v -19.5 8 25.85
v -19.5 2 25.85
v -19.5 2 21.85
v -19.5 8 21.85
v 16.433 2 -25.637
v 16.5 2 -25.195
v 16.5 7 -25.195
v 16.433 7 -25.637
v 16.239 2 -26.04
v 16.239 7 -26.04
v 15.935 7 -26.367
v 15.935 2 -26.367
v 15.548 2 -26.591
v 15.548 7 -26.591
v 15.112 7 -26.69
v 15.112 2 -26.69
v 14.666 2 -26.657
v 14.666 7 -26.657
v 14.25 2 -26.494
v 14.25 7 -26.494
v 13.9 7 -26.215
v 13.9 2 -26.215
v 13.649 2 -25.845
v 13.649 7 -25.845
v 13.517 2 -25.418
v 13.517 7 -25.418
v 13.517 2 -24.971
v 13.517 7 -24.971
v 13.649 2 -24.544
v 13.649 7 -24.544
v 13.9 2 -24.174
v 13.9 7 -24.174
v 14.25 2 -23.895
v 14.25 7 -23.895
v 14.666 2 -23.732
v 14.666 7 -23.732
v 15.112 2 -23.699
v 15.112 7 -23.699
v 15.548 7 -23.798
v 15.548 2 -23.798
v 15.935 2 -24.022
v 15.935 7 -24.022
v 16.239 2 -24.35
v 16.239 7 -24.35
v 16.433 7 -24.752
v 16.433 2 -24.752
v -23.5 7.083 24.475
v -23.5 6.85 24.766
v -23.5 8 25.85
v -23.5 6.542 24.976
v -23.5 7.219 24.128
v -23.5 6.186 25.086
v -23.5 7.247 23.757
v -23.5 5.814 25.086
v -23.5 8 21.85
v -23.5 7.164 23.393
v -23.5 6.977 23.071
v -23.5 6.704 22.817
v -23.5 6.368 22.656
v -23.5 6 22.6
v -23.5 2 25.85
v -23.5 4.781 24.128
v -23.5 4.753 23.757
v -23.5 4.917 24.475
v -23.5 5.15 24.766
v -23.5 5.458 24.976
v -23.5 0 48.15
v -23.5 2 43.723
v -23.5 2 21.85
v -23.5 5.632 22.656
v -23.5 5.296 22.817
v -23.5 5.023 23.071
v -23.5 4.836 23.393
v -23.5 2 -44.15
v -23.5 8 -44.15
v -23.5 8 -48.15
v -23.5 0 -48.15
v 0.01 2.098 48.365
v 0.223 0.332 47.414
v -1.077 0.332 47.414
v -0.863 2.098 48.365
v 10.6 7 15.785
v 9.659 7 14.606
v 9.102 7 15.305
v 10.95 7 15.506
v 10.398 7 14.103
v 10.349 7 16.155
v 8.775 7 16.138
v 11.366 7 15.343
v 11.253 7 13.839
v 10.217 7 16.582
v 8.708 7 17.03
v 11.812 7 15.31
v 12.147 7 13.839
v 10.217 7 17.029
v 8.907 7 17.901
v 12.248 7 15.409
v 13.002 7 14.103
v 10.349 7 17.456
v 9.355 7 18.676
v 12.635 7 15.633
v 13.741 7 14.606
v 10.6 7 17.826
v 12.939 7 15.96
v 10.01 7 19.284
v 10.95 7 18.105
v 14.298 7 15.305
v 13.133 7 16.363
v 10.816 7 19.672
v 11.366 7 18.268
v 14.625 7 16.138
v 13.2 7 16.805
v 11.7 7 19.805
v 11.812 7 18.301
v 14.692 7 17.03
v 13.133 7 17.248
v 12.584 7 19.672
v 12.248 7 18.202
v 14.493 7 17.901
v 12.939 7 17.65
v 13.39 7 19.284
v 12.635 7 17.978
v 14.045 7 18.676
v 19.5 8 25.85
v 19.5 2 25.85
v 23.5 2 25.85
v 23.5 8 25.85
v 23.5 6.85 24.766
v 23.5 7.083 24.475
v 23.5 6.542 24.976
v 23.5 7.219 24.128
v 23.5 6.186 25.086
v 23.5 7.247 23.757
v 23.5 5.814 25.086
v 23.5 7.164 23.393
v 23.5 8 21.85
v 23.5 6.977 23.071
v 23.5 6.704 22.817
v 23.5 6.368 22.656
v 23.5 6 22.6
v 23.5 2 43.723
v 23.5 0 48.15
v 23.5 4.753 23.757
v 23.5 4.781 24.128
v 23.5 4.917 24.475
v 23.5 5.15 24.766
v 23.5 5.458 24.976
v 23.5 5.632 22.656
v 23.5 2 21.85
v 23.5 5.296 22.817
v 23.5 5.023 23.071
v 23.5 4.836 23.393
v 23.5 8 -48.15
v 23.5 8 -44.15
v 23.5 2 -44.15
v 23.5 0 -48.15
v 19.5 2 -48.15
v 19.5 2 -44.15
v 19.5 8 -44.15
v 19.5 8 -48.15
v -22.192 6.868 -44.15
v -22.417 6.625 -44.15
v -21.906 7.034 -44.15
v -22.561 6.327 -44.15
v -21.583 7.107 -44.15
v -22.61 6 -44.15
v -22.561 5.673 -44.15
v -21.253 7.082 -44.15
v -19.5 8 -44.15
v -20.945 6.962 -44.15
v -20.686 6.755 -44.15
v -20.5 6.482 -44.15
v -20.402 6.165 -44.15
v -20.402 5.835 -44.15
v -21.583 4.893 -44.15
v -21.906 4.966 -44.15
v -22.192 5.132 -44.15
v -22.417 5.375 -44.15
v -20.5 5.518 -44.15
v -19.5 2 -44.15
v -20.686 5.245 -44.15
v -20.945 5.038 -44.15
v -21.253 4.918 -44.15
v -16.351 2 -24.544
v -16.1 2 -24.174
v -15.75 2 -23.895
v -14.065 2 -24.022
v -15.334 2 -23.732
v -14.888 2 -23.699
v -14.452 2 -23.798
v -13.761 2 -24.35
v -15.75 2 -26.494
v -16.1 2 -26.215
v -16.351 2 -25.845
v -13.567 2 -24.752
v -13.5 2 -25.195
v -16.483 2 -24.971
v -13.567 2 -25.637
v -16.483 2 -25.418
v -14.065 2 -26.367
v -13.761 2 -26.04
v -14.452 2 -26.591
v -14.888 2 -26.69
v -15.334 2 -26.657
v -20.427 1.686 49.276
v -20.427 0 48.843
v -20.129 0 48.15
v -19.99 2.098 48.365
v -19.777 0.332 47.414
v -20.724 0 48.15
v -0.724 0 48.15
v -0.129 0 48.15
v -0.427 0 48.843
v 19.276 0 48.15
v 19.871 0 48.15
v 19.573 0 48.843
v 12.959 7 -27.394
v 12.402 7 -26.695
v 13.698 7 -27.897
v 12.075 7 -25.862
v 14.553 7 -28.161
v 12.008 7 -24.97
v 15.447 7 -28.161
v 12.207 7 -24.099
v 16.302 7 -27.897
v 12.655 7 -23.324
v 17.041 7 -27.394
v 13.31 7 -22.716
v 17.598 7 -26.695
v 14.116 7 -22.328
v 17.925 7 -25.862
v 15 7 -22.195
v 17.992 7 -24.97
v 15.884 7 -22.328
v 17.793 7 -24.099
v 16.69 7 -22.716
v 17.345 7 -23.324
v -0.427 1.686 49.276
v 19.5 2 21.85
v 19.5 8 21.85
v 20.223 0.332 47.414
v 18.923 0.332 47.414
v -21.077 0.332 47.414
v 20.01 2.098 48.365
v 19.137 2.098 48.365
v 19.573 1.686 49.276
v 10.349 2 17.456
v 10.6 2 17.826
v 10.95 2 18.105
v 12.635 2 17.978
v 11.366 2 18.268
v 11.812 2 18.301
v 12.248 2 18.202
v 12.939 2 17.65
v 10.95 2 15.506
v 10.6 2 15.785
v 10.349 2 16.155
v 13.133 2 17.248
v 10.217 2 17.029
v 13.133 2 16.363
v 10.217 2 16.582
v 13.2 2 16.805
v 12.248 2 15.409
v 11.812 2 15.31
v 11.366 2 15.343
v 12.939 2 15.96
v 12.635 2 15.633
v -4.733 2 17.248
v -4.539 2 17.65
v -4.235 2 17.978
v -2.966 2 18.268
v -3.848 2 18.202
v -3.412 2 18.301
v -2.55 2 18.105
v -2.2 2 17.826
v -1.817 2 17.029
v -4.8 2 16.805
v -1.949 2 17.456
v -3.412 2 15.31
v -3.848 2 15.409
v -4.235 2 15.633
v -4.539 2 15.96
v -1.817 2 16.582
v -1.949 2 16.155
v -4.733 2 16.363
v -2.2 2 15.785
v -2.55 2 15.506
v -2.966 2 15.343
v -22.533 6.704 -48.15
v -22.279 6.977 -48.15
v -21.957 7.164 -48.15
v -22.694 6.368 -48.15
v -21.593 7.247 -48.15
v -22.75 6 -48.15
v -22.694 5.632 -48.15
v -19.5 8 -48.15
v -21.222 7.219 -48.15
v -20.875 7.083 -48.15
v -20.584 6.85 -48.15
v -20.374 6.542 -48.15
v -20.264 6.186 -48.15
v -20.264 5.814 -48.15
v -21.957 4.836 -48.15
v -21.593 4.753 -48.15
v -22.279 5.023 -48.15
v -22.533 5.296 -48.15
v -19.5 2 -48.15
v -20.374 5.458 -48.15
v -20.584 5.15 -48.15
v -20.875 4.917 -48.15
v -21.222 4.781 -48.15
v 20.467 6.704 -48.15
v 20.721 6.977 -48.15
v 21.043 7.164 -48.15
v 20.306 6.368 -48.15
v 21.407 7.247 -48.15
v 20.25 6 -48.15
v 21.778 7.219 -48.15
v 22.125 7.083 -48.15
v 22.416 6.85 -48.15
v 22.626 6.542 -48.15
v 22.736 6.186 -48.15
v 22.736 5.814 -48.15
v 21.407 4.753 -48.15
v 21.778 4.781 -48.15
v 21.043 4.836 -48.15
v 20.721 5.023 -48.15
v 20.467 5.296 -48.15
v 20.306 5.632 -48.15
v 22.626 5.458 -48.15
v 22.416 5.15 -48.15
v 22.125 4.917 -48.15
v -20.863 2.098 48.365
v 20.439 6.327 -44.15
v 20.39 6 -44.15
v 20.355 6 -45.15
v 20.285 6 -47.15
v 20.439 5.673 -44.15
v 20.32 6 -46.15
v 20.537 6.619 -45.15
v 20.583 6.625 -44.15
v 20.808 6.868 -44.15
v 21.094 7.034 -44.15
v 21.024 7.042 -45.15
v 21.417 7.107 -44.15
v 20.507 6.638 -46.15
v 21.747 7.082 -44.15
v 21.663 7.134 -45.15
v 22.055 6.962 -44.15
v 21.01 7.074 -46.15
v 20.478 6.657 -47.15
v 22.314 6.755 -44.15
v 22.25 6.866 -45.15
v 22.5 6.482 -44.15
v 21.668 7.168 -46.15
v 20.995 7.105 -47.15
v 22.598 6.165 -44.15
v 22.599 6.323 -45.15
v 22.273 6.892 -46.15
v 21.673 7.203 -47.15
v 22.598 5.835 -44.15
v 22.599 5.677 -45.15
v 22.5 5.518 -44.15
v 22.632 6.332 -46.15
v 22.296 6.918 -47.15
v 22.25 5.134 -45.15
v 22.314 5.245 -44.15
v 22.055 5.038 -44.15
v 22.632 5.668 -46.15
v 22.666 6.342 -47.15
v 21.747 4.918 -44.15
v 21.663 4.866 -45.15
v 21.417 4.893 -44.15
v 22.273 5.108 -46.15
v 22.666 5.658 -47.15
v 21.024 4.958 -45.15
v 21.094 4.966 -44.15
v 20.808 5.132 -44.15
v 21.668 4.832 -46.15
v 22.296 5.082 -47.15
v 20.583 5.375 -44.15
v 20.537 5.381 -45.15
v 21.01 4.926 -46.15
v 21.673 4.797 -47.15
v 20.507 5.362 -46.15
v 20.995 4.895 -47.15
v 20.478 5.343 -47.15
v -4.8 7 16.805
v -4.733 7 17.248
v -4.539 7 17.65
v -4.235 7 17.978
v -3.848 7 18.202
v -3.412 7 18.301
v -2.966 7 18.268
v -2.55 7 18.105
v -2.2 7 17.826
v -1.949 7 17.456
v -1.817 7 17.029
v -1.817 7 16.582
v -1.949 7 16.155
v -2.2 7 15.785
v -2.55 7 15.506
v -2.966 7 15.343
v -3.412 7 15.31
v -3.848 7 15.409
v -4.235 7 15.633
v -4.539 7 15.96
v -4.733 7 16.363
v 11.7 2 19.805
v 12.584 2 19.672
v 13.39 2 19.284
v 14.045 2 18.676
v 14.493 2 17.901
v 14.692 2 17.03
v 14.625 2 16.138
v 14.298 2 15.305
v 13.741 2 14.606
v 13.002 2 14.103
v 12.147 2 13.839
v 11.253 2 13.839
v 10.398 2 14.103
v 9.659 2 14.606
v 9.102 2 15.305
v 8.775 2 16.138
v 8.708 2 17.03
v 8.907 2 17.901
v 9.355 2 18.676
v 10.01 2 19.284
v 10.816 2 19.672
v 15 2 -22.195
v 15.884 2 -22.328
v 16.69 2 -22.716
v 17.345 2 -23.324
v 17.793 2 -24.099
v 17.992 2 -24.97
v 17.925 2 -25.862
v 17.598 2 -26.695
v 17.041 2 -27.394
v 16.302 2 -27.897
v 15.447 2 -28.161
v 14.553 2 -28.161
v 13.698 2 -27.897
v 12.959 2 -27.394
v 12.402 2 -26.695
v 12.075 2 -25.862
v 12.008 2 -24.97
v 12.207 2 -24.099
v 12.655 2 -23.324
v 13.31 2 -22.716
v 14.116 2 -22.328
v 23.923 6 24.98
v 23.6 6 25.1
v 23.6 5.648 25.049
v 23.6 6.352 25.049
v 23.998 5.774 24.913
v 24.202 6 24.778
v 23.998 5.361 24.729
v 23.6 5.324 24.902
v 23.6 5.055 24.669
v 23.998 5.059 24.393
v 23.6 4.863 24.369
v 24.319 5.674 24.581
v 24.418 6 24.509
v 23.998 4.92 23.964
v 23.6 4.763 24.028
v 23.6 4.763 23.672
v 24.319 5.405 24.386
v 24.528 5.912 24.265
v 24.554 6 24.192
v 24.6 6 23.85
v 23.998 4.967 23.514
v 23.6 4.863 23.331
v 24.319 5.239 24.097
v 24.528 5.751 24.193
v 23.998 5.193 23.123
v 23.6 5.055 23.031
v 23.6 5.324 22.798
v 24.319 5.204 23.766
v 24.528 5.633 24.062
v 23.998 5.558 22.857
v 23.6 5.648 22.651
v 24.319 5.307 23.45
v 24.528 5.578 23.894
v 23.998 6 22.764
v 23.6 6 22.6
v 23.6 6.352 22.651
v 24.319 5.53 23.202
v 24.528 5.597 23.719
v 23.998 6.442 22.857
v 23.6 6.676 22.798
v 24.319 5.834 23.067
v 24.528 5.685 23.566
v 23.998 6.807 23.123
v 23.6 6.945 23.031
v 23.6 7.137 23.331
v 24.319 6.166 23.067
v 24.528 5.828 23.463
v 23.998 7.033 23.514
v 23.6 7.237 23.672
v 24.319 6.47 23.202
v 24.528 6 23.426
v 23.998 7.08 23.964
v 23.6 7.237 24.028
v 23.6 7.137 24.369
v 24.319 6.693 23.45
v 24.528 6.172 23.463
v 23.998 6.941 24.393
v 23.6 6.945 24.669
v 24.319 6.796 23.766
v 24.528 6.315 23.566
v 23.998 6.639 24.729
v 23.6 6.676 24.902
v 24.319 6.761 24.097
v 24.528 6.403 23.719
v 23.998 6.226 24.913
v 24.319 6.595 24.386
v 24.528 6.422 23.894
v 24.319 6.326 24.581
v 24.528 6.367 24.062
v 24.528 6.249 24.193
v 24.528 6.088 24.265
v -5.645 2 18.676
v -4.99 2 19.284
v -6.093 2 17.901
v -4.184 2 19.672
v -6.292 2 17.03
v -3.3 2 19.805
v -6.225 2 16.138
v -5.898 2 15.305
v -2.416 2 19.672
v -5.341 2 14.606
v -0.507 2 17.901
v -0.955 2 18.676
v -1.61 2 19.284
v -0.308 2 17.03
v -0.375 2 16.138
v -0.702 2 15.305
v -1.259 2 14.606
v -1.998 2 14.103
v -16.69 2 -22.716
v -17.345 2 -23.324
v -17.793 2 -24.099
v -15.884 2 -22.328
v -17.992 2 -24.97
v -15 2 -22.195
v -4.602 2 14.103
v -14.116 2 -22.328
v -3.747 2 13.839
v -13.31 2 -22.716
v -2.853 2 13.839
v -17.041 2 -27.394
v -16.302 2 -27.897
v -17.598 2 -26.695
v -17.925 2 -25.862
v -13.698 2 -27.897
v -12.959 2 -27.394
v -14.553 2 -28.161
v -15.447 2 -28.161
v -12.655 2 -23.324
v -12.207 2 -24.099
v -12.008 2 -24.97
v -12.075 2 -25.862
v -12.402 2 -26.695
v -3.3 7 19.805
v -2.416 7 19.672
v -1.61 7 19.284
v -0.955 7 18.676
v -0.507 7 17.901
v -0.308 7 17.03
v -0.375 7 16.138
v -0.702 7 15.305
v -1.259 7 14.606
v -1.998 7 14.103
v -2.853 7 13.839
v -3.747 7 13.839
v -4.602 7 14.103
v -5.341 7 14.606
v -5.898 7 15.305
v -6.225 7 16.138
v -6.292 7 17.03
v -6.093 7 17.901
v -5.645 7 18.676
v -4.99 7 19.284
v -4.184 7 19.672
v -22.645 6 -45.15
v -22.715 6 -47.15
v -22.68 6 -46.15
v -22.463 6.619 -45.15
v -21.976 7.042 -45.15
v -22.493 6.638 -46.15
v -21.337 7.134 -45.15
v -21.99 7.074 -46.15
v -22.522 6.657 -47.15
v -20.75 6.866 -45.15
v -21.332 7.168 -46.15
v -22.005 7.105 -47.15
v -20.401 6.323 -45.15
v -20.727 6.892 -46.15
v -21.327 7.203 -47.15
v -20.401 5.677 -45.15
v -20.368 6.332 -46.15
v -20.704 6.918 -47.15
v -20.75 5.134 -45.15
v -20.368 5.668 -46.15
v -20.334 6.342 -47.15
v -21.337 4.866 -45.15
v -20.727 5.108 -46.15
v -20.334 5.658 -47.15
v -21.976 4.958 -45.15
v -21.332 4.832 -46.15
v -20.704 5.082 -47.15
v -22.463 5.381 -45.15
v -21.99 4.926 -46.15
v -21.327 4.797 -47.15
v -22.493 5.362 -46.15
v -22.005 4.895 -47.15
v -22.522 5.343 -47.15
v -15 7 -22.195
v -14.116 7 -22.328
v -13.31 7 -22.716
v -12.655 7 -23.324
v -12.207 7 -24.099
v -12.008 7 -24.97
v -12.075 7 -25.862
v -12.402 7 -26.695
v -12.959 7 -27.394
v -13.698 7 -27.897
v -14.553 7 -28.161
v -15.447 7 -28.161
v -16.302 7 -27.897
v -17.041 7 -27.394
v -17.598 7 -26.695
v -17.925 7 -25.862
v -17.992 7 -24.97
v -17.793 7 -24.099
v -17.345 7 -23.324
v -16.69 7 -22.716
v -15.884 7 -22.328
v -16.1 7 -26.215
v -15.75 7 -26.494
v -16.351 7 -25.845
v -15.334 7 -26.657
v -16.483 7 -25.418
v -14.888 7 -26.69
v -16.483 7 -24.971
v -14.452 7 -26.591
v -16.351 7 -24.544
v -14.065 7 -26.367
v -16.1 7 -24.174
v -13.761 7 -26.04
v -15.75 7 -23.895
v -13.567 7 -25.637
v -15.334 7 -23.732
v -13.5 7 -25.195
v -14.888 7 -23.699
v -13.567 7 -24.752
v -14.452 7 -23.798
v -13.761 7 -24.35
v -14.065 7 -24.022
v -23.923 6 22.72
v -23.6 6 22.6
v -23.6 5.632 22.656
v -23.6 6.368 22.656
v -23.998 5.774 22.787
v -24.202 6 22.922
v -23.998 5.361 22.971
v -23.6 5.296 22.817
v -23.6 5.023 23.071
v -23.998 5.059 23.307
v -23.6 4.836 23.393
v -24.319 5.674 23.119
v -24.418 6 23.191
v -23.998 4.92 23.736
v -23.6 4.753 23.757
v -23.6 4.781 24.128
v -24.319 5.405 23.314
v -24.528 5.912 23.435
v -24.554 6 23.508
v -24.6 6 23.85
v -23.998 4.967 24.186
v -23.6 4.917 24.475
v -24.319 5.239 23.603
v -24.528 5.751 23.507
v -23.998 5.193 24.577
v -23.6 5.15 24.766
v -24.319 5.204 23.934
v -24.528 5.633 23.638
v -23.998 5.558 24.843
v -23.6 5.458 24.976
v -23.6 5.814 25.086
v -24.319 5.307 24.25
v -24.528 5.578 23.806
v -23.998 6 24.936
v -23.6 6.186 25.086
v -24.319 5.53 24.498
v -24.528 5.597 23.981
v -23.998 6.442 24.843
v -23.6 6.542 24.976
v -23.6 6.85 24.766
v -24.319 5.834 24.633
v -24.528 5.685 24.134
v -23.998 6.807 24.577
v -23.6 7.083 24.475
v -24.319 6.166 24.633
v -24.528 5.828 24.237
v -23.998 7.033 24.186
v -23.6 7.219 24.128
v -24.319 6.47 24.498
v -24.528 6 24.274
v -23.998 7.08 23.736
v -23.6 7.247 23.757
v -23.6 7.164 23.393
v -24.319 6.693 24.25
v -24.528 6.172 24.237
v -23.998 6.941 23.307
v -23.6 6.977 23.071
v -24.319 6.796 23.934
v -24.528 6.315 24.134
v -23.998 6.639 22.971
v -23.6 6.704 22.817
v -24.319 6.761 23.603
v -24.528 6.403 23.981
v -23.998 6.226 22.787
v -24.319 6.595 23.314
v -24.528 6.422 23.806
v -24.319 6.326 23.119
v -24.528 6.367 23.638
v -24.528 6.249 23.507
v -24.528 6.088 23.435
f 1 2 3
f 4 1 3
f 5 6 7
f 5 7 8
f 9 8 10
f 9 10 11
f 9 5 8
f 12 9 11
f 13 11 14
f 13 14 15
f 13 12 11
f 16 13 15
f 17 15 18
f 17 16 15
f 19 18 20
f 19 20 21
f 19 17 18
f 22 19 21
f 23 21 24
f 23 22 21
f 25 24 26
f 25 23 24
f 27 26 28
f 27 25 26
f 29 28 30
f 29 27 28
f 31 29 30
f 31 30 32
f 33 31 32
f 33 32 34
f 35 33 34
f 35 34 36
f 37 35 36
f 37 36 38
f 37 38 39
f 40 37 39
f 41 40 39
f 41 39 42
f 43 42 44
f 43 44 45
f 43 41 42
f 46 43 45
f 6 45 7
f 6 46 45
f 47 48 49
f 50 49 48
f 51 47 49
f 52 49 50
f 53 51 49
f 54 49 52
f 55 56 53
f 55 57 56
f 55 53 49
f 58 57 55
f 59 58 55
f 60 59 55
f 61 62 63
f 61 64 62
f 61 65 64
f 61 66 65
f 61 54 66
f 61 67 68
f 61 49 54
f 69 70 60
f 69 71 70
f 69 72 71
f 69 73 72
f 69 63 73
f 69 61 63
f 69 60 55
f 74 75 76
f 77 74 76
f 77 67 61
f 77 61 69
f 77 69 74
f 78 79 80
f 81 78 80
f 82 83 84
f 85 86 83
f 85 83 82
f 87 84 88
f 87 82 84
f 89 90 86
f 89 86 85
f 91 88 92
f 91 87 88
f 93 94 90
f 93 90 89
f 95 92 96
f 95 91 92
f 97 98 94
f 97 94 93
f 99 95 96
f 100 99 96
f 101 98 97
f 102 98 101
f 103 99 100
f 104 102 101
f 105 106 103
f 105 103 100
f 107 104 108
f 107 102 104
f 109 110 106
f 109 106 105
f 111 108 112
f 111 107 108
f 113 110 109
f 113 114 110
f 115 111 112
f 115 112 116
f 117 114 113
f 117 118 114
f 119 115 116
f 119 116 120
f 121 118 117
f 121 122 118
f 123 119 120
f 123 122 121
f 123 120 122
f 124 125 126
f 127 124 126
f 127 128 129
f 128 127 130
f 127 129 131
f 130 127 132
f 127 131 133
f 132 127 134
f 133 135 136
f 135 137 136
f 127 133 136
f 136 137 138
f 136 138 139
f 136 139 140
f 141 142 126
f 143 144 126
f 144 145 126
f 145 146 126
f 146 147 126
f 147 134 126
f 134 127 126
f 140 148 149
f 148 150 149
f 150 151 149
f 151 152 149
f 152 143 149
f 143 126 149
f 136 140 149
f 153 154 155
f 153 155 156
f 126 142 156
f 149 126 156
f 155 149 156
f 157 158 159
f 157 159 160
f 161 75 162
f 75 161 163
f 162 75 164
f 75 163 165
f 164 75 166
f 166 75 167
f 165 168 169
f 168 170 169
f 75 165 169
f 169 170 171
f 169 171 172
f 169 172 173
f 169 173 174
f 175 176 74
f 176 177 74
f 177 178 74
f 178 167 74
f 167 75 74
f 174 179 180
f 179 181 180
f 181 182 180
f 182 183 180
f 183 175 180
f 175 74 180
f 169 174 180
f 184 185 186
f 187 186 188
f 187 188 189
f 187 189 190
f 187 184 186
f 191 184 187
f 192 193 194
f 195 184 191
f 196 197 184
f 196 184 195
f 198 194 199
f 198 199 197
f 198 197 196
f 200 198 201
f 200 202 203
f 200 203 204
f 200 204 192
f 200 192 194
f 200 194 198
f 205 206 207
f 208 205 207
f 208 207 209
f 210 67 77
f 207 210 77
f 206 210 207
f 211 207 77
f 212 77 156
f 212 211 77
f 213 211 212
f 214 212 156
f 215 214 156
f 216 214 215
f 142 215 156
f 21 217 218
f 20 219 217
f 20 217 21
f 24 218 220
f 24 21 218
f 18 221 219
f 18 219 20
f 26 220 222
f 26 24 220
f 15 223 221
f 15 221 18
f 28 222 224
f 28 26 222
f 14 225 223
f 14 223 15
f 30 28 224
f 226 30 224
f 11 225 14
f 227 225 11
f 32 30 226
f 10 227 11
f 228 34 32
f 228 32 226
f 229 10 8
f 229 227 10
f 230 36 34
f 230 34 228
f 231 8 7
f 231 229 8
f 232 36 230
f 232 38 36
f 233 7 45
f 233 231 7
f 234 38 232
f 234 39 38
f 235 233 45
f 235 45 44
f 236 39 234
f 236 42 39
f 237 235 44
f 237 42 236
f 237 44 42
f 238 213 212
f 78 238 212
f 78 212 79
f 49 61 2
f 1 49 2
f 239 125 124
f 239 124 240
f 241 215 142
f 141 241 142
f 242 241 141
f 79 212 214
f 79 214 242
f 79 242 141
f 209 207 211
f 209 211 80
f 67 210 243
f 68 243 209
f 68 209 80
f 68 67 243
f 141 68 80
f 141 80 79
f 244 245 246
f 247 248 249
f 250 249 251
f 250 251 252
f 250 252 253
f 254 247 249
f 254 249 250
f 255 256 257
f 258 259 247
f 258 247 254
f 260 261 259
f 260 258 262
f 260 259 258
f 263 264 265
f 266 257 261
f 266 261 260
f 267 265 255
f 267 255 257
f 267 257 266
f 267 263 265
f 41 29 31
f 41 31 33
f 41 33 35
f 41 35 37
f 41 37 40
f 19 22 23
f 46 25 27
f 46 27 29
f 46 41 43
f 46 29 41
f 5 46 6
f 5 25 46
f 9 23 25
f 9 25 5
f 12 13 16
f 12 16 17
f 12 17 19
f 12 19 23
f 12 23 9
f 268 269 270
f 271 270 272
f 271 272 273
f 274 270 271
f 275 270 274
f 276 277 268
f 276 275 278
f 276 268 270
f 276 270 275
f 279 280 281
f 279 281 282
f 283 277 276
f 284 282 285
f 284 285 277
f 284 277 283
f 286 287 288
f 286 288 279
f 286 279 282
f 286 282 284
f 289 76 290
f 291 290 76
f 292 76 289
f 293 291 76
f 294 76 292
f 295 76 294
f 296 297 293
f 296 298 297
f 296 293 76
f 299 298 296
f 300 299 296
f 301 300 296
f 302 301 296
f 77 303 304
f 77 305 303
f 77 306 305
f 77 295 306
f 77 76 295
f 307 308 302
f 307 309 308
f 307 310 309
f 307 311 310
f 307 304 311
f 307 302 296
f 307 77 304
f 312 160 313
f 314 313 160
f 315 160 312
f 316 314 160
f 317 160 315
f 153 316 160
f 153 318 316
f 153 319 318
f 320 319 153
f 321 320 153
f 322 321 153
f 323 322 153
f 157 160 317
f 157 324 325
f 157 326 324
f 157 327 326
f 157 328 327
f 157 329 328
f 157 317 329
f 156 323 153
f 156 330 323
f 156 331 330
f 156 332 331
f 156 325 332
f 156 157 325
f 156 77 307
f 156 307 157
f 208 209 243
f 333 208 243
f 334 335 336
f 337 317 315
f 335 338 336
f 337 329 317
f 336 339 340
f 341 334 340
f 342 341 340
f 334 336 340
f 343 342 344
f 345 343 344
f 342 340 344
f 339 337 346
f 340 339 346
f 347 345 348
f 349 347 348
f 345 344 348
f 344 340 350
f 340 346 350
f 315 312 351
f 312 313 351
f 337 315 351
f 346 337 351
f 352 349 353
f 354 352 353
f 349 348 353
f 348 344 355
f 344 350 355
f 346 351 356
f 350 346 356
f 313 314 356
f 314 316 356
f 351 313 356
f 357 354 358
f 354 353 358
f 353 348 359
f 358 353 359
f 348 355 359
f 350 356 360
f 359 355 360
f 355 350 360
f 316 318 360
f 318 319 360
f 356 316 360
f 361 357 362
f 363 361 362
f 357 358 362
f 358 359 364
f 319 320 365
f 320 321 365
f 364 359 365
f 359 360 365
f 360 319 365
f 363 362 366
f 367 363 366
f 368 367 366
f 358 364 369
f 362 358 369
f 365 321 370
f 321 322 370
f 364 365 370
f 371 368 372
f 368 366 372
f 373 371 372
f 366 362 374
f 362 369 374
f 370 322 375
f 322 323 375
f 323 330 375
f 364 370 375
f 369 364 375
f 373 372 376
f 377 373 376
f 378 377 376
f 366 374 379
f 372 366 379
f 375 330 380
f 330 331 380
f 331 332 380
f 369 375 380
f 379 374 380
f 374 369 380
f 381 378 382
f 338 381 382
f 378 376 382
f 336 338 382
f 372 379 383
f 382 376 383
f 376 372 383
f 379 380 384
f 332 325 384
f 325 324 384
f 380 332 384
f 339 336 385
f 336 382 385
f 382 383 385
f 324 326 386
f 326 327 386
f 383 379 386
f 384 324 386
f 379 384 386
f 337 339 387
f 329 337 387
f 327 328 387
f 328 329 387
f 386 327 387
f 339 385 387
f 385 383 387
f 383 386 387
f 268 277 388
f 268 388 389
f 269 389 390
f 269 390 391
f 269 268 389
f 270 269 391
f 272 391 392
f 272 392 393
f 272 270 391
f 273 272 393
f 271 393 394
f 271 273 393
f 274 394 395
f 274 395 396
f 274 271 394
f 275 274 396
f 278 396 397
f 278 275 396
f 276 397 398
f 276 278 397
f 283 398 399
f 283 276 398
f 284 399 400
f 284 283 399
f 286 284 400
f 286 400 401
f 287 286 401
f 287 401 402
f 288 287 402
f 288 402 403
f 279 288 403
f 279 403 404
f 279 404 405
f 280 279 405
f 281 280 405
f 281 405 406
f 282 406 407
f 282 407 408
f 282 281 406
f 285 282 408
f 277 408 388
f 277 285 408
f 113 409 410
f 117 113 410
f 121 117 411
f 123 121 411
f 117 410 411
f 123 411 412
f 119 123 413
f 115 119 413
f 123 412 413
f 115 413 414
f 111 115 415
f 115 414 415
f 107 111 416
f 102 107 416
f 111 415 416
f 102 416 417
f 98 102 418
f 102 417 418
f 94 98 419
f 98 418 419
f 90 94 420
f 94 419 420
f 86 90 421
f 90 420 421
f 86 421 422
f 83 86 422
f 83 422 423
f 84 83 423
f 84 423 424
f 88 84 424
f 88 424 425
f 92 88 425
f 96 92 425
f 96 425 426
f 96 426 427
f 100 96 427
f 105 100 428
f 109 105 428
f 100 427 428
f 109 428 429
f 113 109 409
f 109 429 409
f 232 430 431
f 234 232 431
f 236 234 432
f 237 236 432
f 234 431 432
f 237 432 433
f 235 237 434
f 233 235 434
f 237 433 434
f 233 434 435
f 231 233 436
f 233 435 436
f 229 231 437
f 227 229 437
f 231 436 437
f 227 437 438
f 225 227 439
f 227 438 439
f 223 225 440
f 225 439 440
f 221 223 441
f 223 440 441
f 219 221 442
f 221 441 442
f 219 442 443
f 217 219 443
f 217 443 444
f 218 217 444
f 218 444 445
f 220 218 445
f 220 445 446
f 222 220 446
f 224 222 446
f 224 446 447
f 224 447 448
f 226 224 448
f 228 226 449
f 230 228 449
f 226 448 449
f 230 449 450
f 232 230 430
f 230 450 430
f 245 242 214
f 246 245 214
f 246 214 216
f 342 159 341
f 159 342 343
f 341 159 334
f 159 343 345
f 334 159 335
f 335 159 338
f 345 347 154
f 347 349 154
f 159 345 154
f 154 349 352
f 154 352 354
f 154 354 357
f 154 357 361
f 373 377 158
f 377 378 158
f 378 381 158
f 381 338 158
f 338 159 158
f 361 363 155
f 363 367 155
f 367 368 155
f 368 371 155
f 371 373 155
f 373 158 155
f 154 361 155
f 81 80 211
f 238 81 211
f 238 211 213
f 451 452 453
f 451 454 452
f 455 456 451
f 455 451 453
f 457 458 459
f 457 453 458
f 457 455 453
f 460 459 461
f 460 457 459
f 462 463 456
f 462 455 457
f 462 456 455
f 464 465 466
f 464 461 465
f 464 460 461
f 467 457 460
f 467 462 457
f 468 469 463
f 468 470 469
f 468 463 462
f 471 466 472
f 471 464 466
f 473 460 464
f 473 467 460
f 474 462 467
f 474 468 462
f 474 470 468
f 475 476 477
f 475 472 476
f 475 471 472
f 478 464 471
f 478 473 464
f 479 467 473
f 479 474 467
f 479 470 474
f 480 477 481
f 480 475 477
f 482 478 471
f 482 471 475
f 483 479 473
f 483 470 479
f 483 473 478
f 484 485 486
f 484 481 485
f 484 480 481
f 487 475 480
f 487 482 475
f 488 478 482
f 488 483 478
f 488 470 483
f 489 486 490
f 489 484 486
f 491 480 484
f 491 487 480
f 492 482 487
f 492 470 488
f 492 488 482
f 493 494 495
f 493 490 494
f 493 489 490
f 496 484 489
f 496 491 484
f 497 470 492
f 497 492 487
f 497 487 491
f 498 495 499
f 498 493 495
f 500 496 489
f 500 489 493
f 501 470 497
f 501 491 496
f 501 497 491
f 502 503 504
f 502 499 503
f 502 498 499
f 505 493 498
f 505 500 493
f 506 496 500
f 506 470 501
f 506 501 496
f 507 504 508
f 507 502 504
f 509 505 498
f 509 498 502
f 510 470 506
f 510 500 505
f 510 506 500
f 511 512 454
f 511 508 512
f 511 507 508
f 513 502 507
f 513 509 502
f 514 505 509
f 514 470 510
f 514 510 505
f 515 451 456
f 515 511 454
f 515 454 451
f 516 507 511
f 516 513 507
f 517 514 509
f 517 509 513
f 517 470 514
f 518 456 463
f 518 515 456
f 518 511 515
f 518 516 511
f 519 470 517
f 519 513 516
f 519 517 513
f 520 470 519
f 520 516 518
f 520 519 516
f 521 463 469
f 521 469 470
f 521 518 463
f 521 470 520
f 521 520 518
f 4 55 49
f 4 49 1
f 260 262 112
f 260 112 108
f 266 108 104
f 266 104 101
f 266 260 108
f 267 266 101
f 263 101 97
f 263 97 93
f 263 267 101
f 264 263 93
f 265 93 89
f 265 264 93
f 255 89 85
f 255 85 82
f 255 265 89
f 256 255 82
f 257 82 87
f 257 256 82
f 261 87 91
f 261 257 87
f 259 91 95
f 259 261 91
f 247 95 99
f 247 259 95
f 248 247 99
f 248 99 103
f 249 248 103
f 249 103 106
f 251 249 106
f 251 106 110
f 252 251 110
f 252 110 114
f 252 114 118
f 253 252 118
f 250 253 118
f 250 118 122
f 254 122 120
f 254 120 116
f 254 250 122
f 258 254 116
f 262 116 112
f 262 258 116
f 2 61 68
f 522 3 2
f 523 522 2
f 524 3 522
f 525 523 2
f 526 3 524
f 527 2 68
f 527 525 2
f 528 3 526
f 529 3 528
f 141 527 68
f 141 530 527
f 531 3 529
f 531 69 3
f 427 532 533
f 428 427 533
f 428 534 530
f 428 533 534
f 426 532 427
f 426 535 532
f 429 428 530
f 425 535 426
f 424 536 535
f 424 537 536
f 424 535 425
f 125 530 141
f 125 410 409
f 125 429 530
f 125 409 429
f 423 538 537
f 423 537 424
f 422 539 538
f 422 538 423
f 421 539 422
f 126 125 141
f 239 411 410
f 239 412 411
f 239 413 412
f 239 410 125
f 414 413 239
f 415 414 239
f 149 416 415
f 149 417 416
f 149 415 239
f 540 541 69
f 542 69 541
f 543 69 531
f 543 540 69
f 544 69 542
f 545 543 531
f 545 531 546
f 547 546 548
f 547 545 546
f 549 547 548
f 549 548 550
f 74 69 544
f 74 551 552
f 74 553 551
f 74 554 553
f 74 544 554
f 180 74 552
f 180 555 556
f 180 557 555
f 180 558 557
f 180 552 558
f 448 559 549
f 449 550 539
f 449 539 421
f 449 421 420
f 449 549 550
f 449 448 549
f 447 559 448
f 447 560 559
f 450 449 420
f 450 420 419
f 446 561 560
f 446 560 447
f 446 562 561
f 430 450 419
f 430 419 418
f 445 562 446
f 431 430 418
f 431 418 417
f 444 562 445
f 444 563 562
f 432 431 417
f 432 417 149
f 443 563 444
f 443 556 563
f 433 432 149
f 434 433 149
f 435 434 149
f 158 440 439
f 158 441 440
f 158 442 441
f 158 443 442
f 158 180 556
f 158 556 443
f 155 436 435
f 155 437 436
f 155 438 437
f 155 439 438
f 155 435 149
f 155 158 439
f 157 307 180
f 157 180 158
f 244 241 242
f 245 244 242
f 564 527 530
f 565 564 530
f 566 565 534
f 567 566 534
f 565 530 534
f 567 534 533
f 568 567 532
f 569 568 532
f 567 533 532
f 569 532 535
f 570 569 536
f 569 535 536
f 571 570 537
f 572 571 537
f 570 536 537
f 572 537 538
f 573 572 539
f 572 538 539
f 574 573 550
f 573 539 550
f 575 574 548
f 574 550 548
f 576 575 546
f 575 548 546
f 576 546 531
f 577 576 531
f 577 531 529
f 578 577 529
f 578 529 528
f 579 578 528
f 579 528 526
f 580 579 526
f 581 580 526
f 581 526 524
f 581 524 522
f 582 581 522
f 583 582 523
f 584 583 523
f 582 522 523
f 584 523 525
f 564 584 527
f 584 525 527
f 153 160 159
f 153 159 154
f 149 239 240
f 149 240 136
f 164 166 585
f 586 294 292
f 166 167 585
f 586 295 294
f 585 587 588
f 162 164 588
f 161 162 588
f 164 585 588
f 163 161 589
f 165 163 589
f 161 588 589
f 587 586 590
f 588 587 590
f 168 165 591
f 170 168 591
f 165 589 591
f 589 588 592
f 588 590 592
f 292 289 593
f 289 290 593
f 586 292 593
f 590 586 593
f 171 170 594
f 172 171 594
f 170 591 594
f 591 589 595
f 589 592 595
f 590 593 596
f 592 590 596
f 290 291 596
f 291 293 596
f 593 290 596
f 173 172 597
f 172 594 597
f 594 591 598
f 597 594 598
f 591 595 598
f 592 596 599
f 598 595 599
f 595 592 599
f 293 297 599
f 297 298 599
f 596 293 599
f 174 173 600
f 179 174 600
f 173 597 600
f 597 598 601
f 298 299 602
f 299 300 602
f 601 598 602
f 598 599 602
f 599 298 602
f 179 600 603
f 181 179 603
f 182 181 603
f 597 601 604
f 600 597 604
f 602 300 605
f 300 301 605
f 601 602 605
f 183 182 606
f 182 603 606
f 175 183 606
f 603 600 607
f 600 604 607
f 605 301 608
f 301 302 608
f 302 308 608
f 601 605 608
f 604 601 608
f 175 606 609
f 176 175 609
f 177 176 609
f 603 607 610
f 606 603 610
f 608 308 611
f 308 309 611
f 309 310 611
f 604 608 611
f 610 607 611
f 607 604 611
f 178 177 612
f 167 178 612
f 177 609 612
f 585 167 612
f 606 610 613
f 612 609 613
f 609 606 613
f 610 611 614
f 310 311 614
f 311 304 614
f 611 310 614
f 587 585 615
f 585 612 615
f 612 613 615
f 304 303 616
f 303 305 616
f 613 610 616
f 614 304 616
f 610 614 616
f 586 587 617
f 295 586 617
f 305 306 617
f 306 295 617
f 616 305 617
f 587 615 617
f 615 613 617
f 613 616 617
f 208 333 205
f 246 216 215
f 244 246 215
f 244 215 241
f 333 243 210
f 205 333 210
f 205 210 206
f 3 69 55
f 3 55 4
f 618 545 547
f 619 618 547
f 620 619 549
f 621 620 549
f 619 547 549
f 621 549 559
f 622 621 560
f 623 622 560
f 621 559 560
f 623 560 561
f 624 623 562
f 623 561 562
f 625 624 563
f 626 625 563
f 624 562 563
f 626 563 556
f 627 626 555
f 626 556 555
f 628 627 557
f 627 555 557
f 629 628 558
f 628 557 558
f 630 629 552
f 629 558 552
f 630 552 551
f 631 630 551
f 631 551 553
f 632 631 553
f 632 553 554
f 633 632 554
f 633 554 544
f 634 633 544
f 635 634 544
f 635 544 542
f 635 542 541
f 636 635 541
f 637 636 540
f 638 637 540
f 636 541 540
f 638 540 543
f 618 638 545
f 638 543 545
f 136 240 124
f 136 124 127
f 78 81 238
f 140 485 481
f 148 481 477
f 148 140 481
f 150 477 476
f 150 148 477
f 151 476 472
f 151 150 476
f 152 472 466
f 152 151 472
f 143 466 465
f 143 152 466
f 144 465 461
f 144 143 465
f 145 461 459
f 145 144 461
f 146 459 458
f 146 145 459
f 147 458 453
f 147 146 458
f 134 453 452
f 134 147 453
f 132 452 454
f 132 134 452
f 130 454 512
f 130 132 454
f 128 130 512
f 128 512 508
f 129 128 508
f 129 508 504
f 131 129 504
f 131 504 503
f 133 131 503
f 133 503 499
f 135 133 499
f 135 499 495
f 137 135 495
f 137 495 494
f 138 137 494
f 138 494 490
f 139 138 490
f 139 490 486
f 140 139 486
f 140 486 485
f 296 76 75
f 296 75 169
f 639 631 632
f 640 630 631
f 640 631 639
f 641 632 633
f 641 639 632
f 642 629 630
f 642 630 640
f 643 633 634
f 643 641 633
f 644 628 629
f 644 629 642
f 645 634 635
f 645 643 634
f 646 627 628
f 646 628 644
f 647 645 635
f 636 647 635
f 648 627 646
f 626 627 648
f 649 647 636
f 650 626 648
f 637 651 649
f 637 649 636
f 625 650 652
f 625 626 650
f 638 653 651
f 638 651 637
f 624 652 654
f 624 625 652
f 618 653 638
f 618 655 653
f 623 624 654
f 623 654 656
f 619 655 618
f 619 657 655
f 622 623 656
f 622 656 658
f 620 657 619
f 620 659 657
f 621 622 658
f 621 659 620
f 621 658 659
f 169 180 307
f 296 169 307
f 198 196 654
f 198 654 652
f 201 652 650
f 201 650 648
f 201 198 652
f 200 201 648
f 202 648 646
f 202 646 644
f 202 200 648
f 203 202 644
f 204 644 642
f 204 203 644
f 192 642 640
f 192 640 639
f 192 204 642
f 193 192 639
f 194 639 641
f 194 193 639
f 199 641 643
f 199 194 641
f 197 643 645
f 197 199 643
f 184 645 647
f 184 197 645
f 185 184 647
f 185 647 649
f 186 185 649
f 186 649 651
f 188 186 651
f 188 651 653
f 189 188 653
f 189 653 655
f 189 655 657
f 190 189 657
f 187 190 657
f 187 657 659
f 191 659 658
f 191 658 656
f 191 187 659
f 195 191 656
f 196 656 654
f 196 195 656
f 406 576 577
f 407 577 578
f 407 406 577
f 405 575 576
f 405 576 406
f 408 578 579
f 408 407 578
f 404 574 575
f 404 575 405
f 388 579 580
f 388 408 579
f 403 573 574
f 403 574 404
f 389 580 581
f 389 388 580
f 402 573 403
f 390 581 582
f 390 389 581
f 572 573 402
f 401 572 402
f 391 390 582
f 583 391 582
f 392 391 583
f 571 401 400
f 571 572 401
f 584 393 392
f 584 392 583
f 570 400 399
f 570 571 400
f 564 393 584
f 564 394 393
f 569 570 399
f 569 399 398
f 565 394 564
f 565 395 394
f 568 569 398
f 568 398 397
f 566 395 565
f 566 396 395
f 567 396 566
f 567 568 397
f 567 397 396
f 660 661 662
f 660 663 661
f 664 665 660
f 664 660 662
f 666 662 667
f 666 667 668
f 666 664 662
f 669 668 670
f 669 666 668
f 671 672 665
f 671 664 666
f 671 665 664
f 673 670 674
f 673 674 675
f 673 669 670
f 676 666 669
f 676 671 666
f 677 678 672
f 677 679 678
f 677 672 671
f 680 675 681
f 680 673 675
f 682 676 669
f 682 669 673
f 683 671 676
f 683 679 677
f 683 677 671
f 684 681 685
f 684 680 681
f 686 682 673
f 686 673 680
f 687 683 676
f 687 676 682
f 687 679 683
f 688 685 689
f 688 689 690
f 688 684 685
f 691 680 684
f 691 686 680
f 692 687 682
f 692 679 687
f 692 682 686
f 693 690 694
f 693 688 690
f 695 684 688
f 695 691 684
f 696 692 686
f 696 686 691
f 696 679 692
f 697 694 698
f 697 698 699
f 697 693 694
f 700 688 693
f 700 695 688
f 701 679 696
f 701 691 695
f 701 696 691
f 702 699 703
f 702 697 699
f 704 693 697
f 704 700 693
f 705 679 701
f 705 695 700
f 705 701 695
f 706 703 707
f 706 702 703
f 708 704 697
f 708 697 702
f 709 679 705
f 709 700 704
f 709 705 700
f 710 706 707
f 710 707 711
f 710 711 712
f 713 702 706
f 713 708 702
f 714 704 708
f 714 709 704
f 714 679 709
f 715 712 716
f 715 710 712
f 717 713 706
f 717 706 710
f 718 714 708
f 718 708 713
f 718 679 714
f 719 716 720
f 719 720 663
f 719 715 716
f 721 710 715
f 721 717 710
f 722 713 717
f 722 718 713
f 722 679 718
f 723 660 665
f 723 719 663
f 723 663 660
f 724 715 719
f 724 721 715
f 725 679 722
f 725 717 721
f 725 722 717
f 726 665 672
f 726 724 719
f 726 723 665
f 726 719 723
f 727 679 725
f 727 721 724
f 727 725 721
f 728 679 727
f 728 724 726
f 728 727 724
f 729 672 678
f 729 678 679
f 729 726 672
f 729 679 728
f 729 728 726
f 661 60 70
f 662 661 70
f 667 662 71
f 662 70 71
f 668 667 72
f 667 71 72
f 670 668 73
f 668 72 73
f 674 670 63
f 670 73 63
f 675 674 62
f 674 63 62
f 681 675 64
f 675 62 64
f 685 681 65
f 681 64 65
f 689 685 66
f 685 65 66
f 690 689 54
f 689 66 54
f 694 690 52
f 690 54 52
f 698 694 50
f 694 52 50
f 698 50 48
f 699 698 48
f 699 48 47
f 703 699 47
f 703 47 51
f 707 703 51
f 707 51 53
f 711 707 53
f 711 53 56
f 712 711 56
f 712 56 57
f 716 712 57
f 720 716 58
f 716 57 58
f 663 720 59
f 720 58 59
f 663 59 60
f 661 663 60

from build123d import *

# Parameters (mm, degrees)
IZIM1_W                               = 47
IZIM1_H                               = 96.3
Y_KSEKLIK_EKSTR_ZYON1_DEPTH           = 2
KES_EKSTR_ZYON1_DEPTH                 = 68.315841375
IZIM3_R                               = 3
Y_KSEKLIK_EKSTR_ZYON2_DEPTH           = 5
Y_KSEKLIK_EKSTR_ZYON3_DEPTH           = 2
Y_KSEKLIK_EKSTR_ZYON3_DRAFT           = 4
Y_KSEKLIK_EKSTR_ZYON3_PROFILE_2_DEPTH = 2
Y_KSEKLIK_EKSTR_ZYON3_PROFILE_2_DRAFT = 4
Y_KSEKLIK_EKSTR_ZYON3_PROFILE_3_DEPTH = 2
Y_KSEKLIK_EKSTR_ZYON3_PROFILE_3_DRAFT = 4
IZIM5_W                               = 47
IZIM5_H                               = 2.496748802
KES_EKSTR_ZYON3_DEPTH                 = 4
IZIM6_W                               = 4
IZIM6_H                               = 4
Y_KSEKLIK_EKSTR_ZYON4_DEPTH           = 6
IZIM7_R                               = 1.25
KES_EKSTR_ZYON4_DEPTH                 = 4
KES_EKSTR_ZYON4_DRAFT                 = -2
KES_EKSTR_ZYON4_PROFILE_2_DEPTH       = 4
KES_EKSTR_ZYON4_PROFILE_2_DRAFT       = -2
IZIM8_R                               = 1.25
Y_KSEKLIK_EKSTR_ZYON5_DEPTH           = 0.1
KUBBE5_FACE_RADIUS                    = 1.25
KUBBE5_HEIGHT                         = 1
AYNALAMA8_COPY_1_FACE_RADIUS          = 1.25
AYNALAMA8_COPY_1_HEIGHT               = 1


with BuildPart() as part:
    # Çizim1 → Yükseklik-Ekstrüzyon1 (new body)
    with BuildSketch(Plane(origin=(0, 0, 0), x_dir=(1, 0, 0), z_dir=(0, 1, 0))):
        Rectangle(IZIM1_W, IZIM1_H)
    extrude(amount=Y_KSEKLIK_EKSTR_ZYON1_DEPTH)

    # Çizim2 → Kes-Ekstrüzyon1 (cut, through all)
    with BuildSketch(Plane.ZY.offset(23.5)):
        Polygon((48.15, 0), (43.722619458, 2), (48.15, 2), align=None)
    extrude(amount=-KES_EKSTR_ZYON1_DEPTH, mode=Mode.SUBTRACT)

    # Çizim3 → Yükseklik-Ekstrüzyon2 (add)
    # profile 1 of 4: a face of its own
    with BuildSketch(Plane(origin=(0, 2, 0), x_dir=(1, 0, 0), z_dir=(0, 1, 0))):
        with Locations(Location((-15, 25.194528994, 0), (0, 0, 270))):
            Circle(IZIM3_R)
        with BuildLine():
            ThreePointArc((-16.5, 25.194528994), (-15, 23.694528994), (-13.5, 25.194528994))
            ThreePointArc((-13.5, 25.194528994), (-15, 26.694528994), (-16.5, 25.194528994))
        make_face(mode=Mode.SUBTRACT)
    # profile 2 of 4: a face of its own
    with BuildSketch(Plane(origin=(0, 2, 0), x_dir=(1, 0, 0), z_dir=(0, 1, 0))):
        with Locations(Location((15, 25.194528994, 0), (0, 0, 270))):
            Circle(IZIM3_R)
        with BuildLine():
            ThreePointArc((13.5, 25.194528994), (15, 23.694528994), (16.5, 25.194528994))
            ThreePointArc((16.5, 25.194528994), (15, 26.694528994), (13.5, 25.194528994))
        make_face(mode=Mode.SUBTRACT)
    # profile 3 of 4: a face of its own
    with BuildSketch(Plane(origin=(0, 2, 0), x_dir=(1, 0, 0), z_dir=(0, 1, 0))):
        with Locations(Location((-3.3, -16.805471006, 0), (0, 0, 270))):
            Circle(IZIM3_R)
        with BuildLine():
            ThreePointArc((-1.8, -16.805471006), (-3.3, -15.305471006), (-4.8, -16.805471006))
            ThreePointArc((-4.8, -16.805471006), (-3.3, -18.305471006), (-1.8, -16.805471006))
        make_face(mode=Mode.SUBTRACT)
    # profile 4 of 4: a face of its own
    with BuildSketch(Plane(origin=(0, 2, 0), x_dir=(1, 0, 0), z_dir=(0, 1, 0))):
        with Locations(Location((11.7, -16.805471006, 0), (0, 0, 270))):
            Circle(IZIM3_R)
        with BuildLine():
            ThreePointArc((10.2, -16.805471006), (11.7, -18.305471006), (13.2, -16.805471006))
            ThreePointArc((13.2, -16.805471006), (11.7, -15.305471006), (10.2, -16.805471006))
        make_face(mode=Mode.SUBTRACT)
    extrude(amount=Y_KSEKLIK_EKSTR_ZYON2_DEPTH)


with BuildPart() as y_kseklik_ekstr_zyon3_tool:
    # Çizim4 → Yükseklik-Ekstrüzyon3 (with draft: the straight prism first)
    with BuildSketch(Plane(origin=(0, 18.064663731, 8.160429654), x_dir=(1, 0, 0), z_dir=(0, 0.9113290688724396, 0.4116786710871625))):
        Polygon((20.223356646, -43.072925072), (18.923356646, -43.072925072), (19.573356646, -44.562410878), align=None)
    extrude(amount=Y_KSEKLIK_EKSTR_ZYON3_DEPTH)
    # Yükseklik-Ekstrüzyon3: the draft: its side faces are tilted about the plane it starts from
    y_kseklik_ekstr_zyon3_sides = [y_kseklik_ekstr_zyon3_tool.faces().sort_by_distance(p)[0] for p in [
        (19.573356646, 1.243788246, 47.825717025),
        (19.248356646, 0.937193478, 48.504422881),
        (19.898356646, 0.937193478, 48.504422881),
    ]]
    draft(y_kseklik_ekstr_zyon3_sides, Plane(origin=(0, 18.064663731, 8.160429654), x_dir=(1, 0, 0), z_dir=(0, 0.9113290688724396, 0.4116786710871625)), Y_KSEKLIK_EKSTR_ZYON3_DRAFT)


with BuildPart() as part_1:
    add(part.part)

    # Yükseklik-Ekstrüzyon3: add y_kseklik_ekstr_zyon3_tool
    add(y_kseklik_ekstr_zyon3_tool.part)


with BuildPart() as y_kseklik_ekstr_zyon3_profile_2_tool:
    # Çizim4 → Yükseklik-Ekstrüzyon3 profile 2 (with draft: the straight prism first)
    with BuildSketch(Plane(origin=(0, 18.064663731, 8.160429654), x_dir=(1, 0, 0), z_dir=(0, 0.9113290688724396, 0.4116786710871625))):
        Polygon((0.223356646, -43.072925072), (-1.076643354, -43.072925072), (-0.426643354, -44.562410878), align=None)
    extrude(amount=Y_KSEKLIK_EKSTR_ZYON3_PROFILE_2_DEPTH)
    # Yükseklik-Ekstrüzyon3 profile 2: the draft: its side faces are tilted about the plane it starts from
    y_kseklik_ekstr_zyon3_profile_2_sides = [y_kseklik_ekstr_zyon3_profile_2_tool.faces().sort_by_distance(p)[0] for p in [
        (-0.426643354, 1.243788246, 47.825717025),
        (-0.751643354, 0.937193478, 48.504422881),
        (-0.101643354, 0.937193478, 48.504422881),
    ]]
    draft(y_kseklik_ekstr_zyon3_profile_2_sides, Plane(origin=(0, 18.064663731, 8.160429654), x_dir=(1, 0, 0), z_dir=(0, 0.9113290688724396, 0.4116786710871625)), Y_KSEKLIK_EKSTR_ZYON3_PROFILE_2_DRAFT)


with BuildPart() as part_2:
    add(part_1.part)

    # Yükseklik-Ekstrüzyon3 profile 2: add y_kseklik_ekstr_zyon3_profile_2_tool
    add(y_kseklik_ekstr_zyon3_profile_2_tool.part)


with BuildPart() as y_kseklik_ekstr_zyon3_profile_3_tool:
    # Çizim4 → Yükseklik-Ekstrüzyon3 profile 3 (with draft: the straight prism first)
    with BuildSketch(Plane(origin=(0, 18.064663731, 8.160429654), x_dir=(1, 0, 0), z_dir=(0, 0.9113290688724396, 0.4116786710871625))):
        Polygon((-21.076643354, -43.072925072), (-20.426643354, -44.562410878), (-19.776643354, -43.072925072), align=None)
    extrude(amount=Y_KSEKLIK_EKSTR_ZYON3_PROFILE_3_DEPTH)
    # Yükseklik-Ekstrüzyon3 profile 3: the draft: its side faces are tilted about the plane it starts from
    y_kseklik_ekstr_zyon3_profile_3_sides = [y_kseklik_ekstr_zyon3_profile_3_tool.faces().sort_by_distance(p)[0] for p in [
        (-20.751643354, 0.937193478, 48.504422881),
        (-20.101643354, 0.937193478, 48.504422881),
        (-20.426643354, 1.243788246, 47.825717025),
    ]]
    draft(y_kseklik_ekstr_zyon3_profile_3_sides, Plane(origin=(0, 18.064663731, 8.160429654), x_dir=(1, 0, 0), z_dir=(0, 0.9113290688724396, 0.4116786710871625)), Y_KSEKLIK_EKSTR_ZYON3_PROFILE_3_DRAFT)


with BuildPart() as part_3:
    add(part_2.part)

    # Yükseklik-Ekstrüzyon3 profile 3: add y_kseklik_ekstr_zyon3_profile_3_tool
    add(y_kseklik_ekstr_zyon3_profile_3_tool.part)

    # Çizim5 → Kes-Ekstrüzyon3 (cut)
    with BuildSketch(Plane.XZ):
        with Locations((0, 49.398374401)):
            Rectangle(IZIM5_W, IZIM5_H)
    extrude(amount=KES_EKSTR_ZYON3_DEPTH, mode=Mode.SUBTRACT)

    # Çizim6 → Yükseklik-Ekstrüzyon4 (add)
    with BuildSketch(Plane(origin=(0, 2, 0), x_dir=(1, 0, 0), z_dir=(0, 1, 0))):
        with Locations((-21.5, 46.15)):
            Rectangle(IZIM6_W, IZIM6_H)
        with Locations((21.5, 46.15)):
            Rectangle(IZIM6_W, IZIM6_H)
        with Locations((-21.5, -23.85)):
            Rectangle(IZIM6_W, IZIM6_H)
        with Locations((21.5, -23.85)):
            Rectangle(IZIM6_W, IZIM6_H)
    extrude(amount=Y_KSEKLIK_EKSTR_ZYON4_DEPTH)


with BuildPart() as kes_ekstr_zyon4_tool:
    # Çizim7 → Kes-Ekstrüzyon4 (with draft: the straight prism first)
    with BuildSketch(Plane(origin=(0, 0, -48.15), x_dir=(-1, 0, 0), z_dir=(0, 0, -1))):
        with Locations((-21.5, 6)):
            Circle(IZIM7_R)
    extrude(amount=-KES_EKSTR_ZYON4_DEPTH)
    # Kes-Ekstrüzyon4: the draft: its side faces are tilted about the plane it starts from
    kes_ekstr_zyon4_sides = [kes_ekstr_zyon4_tool.faces().sort_by_distance(p)[0] for p in [
        (22.75, 6, -46.15),
    ]]
    draft(kes_ekstr_zyon4_sides, Plane(origin=(0, 0, -48.15), x_dir=(-1, 0, 0), z_dir=(0, 0, -1)), KES_EKSTR_ZYON4_DRAFT)


with BuildPart() as part_4:
    add(part_3.part)

    # Kes-Ekstrüzyon4: cut by kes_ekstr_zyon4_tool
    add(kes_ekstr_zyon4_tool.part, mode=Mode.SUBTRACT)


with BuildPart() as kes_ekstr_zyon4_profile_2_tool:
    # Çizim7 → Kes-Ekstrüzyon4 profile 2 (with draft: the straight prism first)
    with BuildSketch(Plane(origin=(0, 0, -48.15), x_dir=(-1, 0, 0), z_dir=(0, 0, -1))):
        with Locations((21.5, 6)):
            Circle(IZIM7_R)
    extrude(amount=-KES_EKSTR_ZYON4_PROFILE_2_DEPTH)
    # Kes-Ekstrüzyon4 profile 2: the draft: its side faces are tilted about the plane it starts from
    kes_ekstr_zyon4_profile_2_sides = [kes_ekstr_zyon4_profile_2_tool.faces().sort_by_distance(p)[0] for p in [
        (-20.25, 6, -46.15),
    ]]
    draft(kes_ekstr_zyon4_profile_2_sides, Plane(origin=(0, 0, -48.15), x_dir=(-1, 0, 0), z_dir=(0, 0, -1)), KES_EKSTR_ZYON4_PROFILE_2_DRAFT)


with BuildPart() as part_5:
    add(part_4.part)

    # Kes-Ekstrüzyon4 profile 2: cut by kes_ekstr_zyon4_profile_2_tool
    add(kes_ekstr_zyon4_profile_2_tool.part, mode=Mode.SUBTRACT)

    # Çizim8 → Yükseklik-Ekstrüzyon5 (add)
    with BuildSketch(Plane.ZY.offset(23.5)):
        with Locations(Location((23.85, 6, 0), (0, 0, 180))):
            Circle(IZIM8_R)
    y_kseklik_ekstr_zyon5 = extrude(amount=Y_KSEKLIK_EKSTR_ZYON5_DEPTH)

    # Kubbe5: a dome of height H over a round flat face of radius A is a cap of a sphere of radius (A * A + H * H) / (2 * H)
    kubbe5_r = (KUBBE5_FACE_RADIUS * KUBBE5_FACE_RADIUS + KUBBE5_HEIGHT * KUBBE5_HEIGHT) / (2 * KUBBE5_HEIGHT)
    kubbe5_base = Plane((-23.6, 6, 23.85), z_dir=(-1, 0, 0))
    with Locations(kubbe5_base.offset(KUBBE5_HEIGHT - kubbe5_r)):
        kubbe5_ball = Sphere(kubbe5_r, mode=Mode.PRIVATE)
    add(split(kubbe5_ball, bisect_by=kubbe5_base, keep=Keep.TOP, mode=Mode.PRIVATE))

    # Aynalama8: Yükseklik-Ekstrüzyon5 across plane
    add(y_kseklik_ekstr_zyon5.mirror(Plane(origin=(0, 0, 0), x_dir=(0, 0, 1), z_dir=(1, 0, 0))))

    # Aynalama8 copy 1: a dome of height H over a round flat face of radius A is a cap of a sphere of radius (A * A + H * H) / (2 * H)
    aynalama8_copy_1_r = (AYNALAMA8_COPY_1_FACE_RADIUS * AYNALAMA8_COPY_1_FACE_RADIUS + AYNALAMA8_COPY_1_HEIGHT * AYNALAMA8_COPY_1_HEIGHT) / (2 * AYNALAMA8_COPY_1_HEIGHT)
    aynalama8_copy_1_base = Plane((23.6, 6, 23.85), z_dir=(1, 0, 0))
    with Locations(aynalama8_copy_1_base.offset(AYNALAMA8_COPY_1_HEIGHT - aynalama8_copy_1_r)):
        aynalama8_copy_1_ball = Sphere(aynalama8_copy_1_r, mode=Mode.PRIVATE)
    add(split(aynalama8_copy_1_ball, bisect_by=aynalama8_copy_1_base, keep=Keep.TOP, mode=Mode.PRIVATE))


solid = part_5.part
